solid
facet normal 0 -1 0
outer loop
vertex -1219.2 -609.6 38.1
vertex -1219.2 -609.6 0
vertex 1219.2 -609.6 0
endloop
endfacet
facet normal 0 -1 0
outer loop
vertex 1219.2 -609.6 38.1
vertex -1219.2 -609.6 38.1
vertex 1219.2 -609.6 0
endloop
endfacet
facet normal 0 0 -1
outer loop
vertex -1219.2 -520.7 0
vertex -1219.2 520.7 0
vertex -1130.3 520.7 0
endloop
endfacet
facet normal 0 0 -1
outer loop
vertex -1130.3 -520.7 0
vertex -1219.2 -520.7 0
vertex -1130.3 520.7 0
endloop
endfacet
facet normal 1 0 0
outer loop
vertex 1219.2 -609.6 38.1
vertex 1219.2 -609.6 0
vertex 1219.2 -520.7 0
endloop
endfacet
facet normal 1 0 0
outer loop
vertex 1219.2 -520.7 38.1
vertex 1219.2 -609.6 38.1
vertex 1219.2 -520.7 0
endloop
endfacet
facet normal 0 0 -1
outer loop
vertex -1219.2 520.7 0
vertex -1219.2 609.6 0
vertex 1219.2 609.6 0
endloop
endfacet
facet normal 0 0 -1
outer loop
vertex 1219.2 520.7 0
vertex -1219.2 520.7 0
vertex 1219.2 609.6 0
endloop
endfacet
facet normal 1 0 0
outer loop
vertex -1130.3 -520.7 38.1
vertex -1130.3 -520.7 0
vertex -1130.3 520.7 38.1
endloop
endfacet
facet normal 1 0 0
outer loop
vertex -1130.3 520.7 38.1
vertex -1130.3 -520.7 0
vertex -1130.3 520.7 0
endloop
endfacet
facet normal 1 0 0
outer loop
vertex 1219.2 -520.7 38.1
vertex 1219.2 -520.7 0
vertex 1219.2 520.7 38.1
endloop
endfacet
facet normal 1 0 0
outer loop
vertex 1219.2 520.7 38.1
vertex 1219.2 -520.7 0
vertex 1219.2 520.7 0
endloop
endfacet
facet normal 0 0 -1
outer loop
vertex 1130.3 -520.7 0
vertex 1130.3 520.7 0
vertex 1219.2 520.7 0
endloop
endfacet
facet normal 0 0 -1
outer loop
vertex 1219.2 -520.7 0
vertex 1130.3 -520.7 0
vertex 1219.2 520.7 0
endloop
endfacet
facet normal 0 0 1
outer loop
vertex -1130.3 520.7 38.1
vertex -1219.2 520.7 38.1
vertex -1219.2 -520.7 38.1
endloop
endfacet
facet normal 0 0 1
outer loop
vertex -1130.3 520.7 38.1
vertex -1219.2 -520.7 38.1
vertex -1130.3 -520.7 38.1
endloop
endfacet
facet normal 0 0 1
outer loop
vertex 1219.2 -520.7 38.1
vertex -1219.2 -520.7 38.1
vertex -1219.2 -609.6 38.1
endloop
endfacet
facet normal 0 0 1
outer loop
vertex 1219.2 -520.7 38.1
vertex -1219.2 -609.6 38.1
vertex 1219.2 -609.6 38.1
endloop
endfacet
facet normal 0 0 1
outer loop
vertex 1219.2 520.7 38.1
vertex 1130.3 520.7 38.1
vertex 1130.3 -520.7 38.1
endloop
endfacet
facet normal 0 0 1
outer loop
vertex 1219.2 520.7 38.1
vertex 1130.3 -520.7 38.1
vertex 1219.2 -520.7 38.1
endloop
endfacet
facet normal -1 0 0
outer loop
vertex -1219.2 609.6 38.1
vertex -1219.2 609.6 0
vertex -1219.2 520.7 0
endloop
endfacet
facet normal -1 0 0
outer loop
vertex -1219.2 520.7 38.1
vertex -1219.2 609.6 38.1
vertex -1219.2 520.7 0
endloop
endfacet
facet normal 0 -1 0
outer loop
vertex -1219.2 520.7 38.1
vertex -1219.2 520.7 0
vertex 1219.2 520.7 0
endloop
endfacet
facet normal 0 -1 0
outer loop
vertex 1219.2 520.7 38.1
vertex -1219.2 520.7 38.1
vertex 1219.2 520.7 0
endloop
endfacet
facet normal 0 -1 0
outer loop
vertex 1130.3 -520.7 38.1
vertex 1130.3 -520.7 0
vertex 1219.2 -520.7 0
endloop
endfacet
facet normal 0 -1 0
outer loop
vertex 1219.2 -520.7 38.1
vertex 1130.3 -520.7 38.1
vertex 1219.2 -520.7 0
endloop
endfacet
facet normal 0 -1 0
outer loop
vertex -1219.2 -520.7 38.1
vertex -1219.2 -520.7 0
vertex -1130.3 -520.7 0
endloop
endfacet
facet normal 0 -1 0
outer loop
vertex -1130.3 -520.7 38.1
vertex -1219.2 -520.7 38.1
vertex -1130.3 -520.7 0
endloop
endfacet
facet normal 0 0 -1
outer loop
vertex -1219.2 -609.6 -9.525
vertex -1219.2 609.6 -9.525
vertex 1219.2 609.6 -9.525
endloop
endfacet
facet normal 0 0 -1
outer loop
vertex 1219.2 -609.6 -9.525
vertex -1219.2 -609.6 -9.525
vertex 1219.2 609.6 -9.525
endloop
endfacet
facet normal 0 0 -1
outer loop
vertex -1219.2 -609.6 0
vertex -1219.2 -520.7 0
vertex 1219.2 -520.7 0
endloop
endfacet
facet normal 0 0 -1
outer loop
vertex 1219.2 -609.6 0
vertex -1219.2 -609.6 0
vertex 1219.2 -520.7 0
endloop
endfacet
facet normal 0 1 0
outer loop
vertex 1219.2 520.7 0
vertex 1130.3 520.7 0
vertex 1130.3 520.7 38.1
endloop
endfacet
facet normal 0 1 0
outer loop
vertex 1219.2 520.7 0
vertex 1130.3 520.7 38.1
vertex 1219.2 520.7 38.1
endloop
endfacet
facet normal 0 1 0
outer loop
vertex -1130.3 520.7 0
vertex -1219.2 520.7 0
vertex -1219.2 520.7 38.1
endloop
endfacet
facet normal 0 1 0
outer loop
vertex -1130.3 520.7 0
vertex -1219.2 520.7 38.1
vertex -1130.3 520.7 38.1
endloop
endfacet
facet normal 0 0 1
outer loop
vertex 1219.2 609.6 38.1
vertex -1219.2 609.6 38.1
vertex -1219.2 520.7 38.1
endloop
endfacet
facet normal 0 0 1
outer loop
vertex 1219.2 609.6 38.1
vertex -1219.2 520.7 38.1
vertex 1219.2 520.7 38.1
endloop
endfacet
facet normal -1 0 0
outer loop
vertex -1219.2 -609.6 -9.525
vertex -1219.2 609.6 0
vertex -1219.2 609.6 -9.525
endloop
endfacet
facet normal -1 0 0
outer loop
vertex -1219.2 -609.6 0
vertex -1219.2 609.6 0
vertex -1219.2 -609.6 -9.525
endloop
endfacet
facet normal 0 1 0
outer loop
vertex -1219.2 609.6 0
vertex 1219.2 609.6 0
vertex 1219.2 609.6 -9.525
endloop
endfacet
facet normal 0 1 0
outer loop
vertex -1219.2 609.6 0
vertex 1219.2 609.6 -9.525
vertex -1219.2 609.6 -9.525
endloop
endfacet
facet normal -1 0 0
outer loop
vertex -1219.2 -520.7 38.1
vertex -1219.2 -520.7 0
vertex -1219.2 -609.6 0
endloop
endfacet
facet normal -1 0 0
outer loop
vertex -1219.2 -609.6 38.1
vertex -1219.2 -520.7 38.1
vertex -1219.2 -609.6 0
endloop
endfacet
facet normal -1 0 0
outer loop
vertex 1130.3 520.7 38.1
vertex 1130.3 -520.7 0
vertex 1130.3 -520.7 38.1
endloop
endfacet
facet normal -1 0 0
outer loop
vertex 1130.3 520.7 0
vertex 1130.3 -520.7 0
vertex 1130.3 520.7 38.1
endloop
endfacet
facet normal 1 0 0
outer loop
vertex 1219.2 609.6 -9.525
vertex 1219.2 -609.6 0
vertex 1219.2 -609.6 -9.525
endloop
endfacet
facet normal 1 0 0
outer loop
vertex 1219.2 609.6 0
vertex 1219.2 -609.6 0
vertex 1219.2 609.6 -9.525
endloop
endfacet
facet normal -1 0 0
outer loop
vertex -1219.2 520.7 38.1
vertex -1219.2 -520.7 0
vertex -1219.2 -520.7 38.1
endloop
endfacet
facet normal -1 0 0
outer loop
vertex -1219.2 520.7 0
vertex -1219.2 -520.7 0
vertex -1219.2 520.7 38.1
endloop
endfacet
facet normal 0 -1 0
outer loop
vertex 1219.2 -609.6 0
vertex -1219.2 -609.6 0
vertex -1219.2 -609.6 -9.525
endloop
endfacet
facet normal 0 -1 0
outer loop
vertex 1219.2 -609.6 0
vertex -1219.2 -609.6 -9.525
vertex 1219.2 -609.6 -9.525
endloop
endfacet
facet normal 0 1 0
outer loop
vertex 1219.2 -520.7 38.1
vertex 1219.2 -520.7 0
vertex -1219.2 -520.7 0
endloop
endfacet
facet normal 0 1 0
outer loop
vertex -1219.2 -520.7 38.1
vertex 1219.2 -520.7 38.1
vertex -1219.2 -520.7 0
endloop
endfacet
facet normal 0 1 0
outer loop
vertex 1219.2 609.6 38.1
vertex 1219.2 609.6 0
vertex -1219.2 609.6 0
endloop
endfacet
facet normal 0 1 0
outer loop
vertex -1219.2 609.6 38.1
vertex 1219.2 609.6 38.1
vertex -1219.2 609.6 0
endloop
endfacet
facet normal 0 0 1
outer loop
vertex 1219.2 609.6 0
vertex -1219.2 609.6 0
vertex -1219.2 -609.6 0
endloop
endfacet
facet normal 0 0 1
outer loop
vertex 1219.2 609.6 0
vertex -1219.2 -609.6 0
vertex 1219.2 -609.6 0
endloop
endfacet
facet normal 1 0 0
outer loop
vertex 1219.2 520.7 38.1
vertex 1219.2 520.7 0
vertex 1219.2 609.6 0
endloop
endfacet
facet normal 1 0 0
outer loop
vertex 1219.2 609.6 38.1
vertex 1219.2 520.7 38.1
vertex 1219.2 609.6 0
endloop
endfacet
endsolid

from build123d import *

# Parameters (mm, degrees)
F1_DEPTH = 38.1
F0_W     = 88.9
F0_H     = 1041.4
F2_DEPTH = 38.1
F0_W_2   = 2260.6
F3_DEPTH = 9.525


with BuildPart() as f1:
    # F0 (on Top) → F1 (new body)
    with BuildSketch(Plane.XY):
        Polygon((1219.2, 520.7), (1219.2, 609.6), (-1219.2, 609.6), (-1219.2, 520.7), (-1130.3, 520.7), (1130.3, 520.7), align=None)
        Polygon((1219.2, -609.6), (1219.2, -520.7), (1130.3, -520.7), (-1130.3, -520.7), (-1219.2, -520.7), (-1219.2, -609.6), align=None)
    extrude(amount=F1_DEPTH)


with BuildPart() as f2:
    # F0 (on Top) → F2 (new body)
    with BuildSketch(Plane.XY):
        with Locations((-1174.75, 0)):
            Rectangle(F0_W, F0_H)
        with Locations((1174.75, 0)):
            Rectangle(F0_W, F0_H)
    extrude(amount=F2_DEPTH)


with BuildPart() as f3:
    # F0 (on Top) → F3 (new body)
    with BuildSketch(Plane.XY):
        Polygon((1219.2, 520.7), (1219.2, 609.6), (-1219.2, 609.6), (-1219.2, 520.7), (-1130.3, 520.7), (1130.3, 520.7), align=None)
        Rectangle(F0_W_2, F0_H)
        with Locations((-1174.75, 0)):
            Rectangle(F0_W, F0_H)
        Polygon((1219.2, -609.6), (1219.2, -520.7), (1130.3, -520.7), (-1130.3, -520.7), (-1219.2, -520.7), (-1219.2, -609.6), align=None)
        with Locations((1174.75, 0)):
            Rectangle(F0_W, F0_H)
    extrude(amount=-F3_DEPTH)


solid = Compound([f1.part, f2.part, f3.part])
